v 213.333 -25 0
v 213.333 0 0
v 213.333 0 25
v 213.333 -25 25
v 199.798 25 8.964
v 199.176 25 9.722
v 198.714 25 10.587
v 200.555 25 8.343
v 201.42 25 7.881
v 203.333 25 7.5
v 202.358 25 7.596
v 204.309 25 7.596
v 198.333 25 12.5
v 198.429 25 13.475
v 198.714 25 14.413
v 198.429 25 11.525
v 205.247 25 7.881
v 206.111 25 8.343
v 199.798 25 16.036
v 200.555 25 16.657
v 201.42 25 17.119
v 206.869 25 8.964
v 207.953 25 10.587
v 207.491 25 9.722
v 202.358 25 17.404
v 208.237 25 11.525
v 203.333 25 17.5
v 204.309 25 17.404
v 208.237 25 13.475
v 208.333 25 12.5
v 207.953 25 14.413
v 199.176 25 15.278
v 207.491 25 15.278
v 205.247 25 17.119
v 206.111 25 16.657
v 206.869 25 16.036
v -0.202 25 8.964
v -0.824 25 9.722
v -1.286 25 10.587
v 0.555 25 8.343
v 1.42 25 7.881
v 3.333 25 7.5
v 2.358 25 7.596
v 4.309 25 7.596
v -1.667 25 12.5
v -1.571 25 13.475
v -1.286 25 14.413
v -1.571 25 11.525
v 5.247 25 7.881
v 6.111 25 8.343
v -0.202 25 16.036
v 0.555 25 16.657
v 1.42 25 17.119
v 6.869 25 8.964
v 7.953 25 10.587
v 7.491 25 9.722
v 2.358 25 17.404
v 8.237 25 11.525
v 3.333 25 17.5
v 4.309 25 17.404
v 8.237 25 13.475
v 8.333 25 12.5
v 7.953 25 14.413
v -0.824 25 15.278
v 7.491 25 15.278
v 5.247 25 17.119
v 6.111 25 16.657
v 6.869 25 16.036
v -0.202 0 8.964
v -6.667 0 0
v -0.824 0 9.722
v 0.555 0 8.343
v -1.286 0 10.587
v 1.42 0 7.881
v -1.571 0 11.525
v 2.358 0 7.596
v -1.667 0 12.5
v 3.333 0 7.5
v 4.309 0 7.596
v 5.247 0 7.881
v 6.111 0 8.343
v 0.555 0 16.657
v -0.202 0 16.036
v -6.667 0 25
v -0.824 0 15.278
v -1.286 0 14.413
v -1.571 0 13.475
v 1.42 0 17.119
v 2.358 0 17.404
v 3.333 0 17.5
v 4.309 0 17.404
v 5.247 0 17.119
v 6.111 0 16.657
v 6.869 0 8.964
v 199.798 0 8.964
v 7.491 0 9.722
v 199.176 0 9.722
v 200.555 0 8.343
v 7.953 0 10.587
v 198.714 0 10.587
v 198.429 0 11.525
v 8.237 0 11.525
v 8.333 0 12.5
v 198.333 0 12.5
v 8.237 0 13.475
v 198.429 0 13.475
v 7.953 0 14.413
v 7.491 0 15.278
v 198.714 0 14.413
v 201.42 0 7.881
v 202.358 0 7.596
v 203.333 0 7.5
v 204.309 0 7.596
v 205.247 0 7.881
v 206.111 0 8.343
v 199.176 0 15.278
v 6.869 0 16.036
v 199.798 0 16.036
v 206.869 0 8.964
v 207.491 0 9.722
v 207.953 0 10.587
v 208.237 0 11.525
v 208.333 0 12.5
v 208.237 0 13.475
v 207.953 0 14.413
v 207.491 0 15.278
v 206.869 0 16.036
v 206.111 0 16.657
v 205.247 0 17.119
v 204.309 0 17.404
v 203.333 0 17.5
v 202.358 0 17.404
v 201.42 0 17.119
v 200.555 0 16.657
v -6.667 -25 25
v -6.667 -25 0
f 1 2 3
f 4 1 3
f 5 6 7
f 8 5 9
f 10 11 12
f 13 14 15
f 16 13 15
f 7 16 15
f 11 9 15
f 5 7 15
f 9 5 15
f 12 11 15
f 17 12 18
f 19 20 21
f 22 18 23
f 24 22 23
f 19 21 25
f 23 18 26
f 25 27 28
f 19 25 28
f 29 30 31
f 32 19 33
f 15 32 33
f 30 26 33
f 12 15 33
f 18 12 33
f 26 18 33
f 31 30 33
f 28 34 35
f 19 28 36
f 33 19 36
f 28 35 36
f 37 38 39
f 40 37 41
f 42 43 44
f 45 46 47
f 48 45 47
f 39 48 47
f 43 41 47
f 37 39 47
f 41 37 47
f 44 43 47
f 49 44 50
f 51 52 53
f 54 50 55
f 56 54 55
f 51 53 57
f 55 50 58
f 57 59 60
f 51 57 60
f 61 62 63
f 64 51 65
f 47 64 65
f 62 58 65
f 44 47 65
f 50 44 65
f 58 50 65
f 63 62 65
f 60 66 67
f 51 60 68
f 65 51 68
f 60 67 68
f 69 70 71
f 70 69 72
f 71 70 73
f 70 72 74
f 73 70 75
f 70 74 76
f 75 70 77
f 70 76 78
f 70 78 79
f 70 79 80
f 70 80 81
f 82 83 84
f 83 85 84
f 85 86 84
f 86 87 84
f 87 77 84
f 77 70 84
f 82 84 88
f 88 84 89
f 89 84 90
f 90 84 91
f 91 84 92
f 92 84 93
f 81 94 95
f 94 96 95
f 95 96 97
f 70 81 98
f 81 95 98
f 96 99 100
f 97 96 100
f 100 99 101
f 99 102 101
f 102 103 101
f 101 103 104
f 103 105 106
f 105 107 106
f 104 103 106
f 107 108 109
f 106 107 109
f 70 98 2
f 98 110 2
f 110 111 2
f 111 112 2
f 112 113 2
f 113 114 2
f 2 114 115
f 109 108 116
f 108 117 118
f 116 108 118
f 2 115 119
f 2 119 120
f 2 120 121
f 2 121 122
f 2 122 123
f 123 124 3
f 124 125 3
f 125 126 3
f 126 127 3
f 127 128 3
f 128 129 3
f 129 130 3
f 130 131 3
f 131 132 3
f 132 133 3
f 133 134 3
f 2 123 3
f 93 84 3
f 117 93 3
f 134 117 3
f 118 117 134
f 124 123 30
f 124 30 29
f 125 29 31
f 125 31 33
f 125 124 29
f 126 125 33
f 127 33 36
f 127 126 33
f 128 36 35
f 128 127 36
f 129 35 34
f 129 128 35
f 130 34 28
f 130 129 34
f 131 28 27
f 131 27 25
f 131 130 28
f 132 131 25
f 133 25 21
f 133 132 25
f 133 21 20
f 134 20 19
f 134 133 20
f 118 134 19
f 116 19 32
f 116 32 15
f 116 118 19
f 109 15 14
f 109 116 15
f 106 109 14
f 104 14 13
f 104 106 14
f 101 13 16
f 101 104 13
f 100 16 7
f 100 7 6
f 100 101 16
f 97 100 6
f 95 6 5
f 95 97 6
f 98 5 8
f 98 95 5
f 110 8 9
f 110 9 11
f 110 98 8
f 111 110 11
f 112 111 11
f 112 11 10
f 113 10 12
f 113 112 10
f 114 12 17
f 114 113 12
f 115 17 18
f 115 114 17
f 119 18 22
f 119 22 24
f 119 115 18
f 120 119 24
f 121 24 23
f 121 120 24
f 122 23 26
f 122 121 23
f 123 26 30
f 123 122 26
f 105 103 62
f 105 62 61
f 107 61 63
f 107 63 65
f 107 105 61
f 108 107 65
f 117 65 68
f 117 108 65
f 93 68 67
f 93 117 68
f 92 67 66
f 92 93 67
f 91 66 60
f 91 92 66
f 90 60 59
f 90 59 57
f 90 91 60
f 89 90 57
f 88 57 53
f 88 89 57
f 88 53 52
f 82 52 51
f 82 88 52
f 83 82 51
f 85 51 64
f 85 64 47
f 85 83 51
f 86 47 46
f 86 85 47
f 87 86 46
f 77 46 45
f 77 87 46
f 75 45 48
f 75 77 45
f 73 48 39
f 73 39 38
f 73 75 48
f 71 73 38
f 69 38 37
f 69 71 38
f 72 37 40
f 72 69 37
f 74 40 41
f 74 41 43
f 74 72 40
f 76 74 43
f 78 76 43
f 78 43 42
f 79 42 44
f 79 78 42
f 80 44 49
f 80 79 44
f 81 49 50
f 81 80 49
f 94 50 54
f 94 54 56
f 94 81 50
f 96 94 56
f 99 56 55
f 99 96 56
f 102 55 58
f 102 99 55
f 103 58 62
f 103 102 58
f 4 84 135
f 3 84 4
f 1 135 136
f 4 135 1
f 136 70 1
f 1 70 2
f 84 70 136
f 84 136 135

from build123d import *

# Parameters (mm, degrees)
F0_W     = 220
F0_H     = 25
F0_R     = 5
F1_DEPTH = 25
F2_DEPTH = 25


with BuildPart() as f1:
    # F0 (on Front) → F1 (new body)
    with BuildSketch(Plane.XZ):
        with Locations((103.33334, 12.5)):
            Rectangle(F0_W, F0_H)
        with Locations((3.33334, 12.5)):
            Circle(F0_R, mode=Mode.SUBTRACT)
        with Locations((203.33334, 12.5)):
            Circle(F0_R, mode=Mode.SUBTRACT)
        with Locations((3.33334, 12.5)):
            Circle(F0_R)
        with Locations((203.33334, 12.5)):
            Circle(F0_R)
    extrude(amount=F1_DEPTH)

    # F0 (on Front) → F2 (join)
    with BuildSketch(Plane.XZ):
        with Locations((3.33334, 12.5)):
            Circle(F0_R)
        with Locations((203.33334, 12.5)):
            Circle(F0_R)
    extrude(amount=-F2_DEPTH)


solid = f1.part
